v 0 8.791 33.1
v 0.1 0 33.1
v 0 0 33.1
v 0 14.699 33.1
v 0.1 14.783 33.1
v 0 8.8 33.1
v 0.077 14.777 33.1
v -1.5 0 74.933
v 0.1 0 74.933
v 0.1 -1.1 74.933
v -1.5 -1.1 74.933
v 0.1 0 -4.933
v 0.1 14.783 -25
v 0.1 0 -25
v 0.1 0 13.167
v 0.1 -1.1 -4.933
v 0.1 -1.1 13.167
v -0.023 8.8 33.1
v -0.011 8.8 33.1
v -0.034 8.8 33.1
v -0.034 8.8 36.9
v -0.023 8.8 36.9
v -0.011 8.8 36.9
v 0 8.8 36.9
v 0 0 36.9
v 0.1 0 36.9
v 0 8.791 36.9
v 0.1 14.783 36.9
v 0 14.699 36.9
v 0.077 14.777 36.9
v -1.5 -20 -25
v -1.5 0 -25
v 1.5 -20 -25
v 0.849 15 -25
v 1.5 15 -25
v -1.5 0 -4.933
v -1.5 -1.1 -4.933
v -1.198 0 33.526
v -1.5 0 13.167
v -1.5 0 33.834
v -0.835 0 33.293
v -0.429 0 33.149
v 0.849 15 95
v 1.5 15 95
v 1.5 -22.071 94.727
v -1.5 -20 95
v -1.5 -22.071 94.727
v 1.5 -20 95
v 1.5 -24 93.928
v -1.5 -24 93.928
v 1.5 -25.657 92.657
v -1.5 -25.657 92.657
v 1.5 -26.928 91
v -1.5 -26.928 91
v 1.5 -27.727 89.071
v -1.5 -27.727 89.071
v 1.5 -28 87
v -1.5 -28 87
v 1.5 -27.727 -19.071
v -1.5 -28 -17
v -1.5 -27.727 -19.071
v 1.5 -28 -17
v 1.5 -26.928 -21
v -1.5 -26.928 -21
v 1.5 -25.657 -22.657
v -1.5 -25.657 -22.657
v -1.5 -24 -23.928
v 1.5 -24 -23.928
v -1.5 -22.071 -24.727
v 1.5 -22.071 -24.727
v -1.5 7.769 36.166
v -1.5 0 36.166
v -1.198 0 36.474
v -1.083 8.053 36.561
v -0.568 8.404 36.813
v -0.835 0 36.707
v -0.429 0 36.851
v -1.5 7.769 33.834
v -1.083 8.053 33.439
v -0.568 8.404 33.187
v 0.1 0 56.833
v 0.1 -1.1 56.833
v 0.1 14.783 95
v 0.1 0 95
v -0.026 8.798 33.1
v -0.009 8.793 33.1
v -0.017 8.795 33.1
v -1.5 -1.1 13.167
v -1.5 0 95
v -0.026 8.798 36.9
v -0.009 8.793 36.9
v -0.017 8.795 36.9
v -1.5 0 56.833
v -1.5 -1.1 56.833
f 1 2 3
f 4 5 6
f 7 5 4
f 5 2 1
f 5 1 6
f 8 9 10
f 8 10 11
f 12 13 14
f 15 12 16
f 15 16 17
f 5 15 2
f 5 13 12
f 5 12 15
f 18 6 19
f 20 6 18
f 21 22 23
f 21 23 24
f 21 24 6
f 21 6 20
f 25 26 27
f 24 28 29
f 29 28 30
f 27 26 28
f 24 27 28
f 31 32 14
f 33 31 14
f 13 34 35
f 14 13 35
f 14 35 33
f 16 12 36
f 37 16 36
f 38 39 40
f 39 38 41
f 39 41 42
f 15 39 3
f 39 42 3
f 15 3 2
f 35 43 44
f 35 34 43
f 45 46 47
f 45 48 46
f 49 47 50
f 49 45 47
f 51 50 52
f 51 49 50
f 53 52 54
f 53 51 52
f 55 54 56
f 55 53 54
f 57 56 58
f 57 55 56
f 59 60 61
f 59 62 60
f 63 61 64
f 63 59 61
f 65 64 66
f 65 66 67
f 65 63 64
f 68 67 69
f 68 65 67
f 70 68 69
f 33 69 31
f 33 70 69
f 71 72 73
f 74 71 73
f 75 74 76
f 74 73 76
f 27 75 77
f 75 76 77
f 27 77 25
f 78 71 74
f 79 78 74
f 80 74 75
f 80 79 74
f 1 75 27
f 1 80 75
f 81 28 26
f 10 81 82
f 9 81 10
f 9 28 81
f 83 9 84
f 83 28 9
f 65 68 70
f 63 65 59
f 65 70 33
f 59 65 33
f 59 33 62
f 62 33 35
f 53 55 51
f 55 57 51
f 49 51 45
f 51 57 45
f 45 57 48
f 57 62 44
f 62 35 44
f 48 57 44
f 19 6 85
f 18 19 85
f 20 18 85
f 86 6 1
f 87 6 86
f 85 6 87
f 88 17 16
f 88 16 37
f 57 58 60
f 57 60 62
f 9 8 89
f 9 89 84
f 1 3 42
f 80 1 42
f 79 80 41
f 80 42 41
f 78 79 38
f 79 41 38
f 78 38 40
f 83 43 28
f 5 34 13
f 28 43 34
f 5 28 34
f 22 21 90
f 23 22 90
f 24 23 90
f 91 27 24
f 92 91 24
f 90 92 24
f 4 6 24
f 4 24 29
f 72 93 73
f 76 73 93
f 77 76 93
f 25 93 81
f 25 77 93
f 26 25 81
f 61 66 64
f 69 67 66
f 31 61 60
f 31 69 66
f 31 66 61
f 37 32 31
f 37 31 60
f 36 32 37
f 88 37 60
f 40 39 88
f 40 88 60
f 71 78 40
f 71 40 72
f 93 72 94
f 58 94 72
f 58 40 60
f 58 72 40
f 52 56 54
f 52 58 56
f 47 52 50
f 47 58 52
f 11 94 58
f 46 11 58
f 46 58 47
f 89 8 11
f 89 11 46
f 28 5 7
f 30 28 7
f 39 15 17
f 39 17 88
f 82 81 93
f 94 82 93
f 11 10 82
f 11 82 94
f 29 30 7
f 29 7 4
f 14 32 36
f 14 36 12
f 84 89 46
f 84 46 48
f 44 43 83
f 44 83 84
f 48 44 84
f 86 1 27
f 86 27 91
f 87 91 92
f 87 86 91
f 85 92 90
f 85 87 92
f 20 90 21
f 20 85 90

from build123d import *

# Parameters (mm, degrees)
F0_W      = 3
F0_H      = 30
F1_DEPTH  = 70
F2_W      = 1.5
F2_H      = 15
F3_DEPTH  = 70
F5_DEPTH  = 8.8
F6_DEPTH  = 25
F7_DEPTH  = 25
F8_DEPTH  = 13
F9_W      = 0.1
F9_H      = 58.1
F10_DEPTH = 15
F12_DEPTH = 130
F14_DEPTH = 130
F15_R     = 8
F17_W     = 1.6
F17_H     = 18.1
F16_W     = 1.6
F16_H     = 18.1
F18_DEPTH = 1.1
F20_DEPTH = 44.7


with BuildPart() as f1:
    # F0 (on Top) → F1 (new body)
    with BuildSketch(Plane.XY):
        Rectangle(F0_W, F0_H)
    extrude(amount=F1_DEPTH)

    # F2 (on face) → F3 (cut)
    with BuildSketch(Plane.XY.offset(70)):
        with Locations((-0.75, 7.5)):
            Rectangle(F2_W, F2_H)
    extrude(amount=-F3_DEPTH, mode=Mode.SUBTRACT)

    # F4 (on face) → F5 (join)
    with BuildSketch(Plane(origin=(0, 0, 0), x_dir=(-1, 0, 0), z_dir=(0, 1, 0))):
        with BuildLine():
            Line((1.5, 33.833809621), (1.5, 36.166190379))
            ThreePointArc((1.5, 36.166190379), (0.8349366084, 36.7067163971), (0, 36.9))
            Line((0, 36.9), (0, 33.1))
            ThreePointArc((0, 33.1), (0.8349366084, 33.2932836029), (1.5, 33.833809621))
        make_face()
    extrude(amount=F5_DEPTH)

    # F6 (add): a face of the model
    f6_faces = [f1.faces().sort_by_distance(p)[0] for p in [
        (0.25, -2.5, 0),
    ]]
    extrude(f6_faces, amount=F6_DEPTH)

    # F7 (add): a face of the model
    f7_faces = [f1.faces().sort_by_distance(p)[0] for p in [
        (0.25, -2.5, 70),
    ]]
    extrude(f7_faces, amount=F7_DEPTH)

    # F8 (add): a face of the model
    f8_faces = [f1.faces().sort_by_distance(p)[0] for p in [
        (0, -15, 35),
    ]]
    extrude(f8_faces, amount=F8_DEPTH)

    # F9 (on face) → F10 (cut)
    with BuildSketch(Plane(origin=(0, 15, 0), x_dir=(-1, 0, 0), z_dir=(0, 1, 0))):
        with Locations((-0.05, 65.95)):
            Rectangle(F9_W, F9_H)
        with Locations((-0.05, 4.05)):
            Rectangle(F9_W, F9_H)
    extrude(amount=-F10_DEPTH, mode=Mode.SUBTRACT)

    # F11 (on face) → F12 (cut)
    with BuildSketch(Plane(origin=(0, 0, -25), x_dir=(1, 0, 0), z_dir=(0, 0, -1))):
        Polygon((-1.7338935286, -15.3450844809), (0.3, -15), (0.1, -15), (0.1, -14.7996032594), (-1.6308530467, -13.0653167143), align=None)
    extrude(amount=-F12_DEPTH, mode=Mode.SUBTRACT)

    # F13 (on face) → F14 (cut)
    with BuildSketch(Plane(origin=(0, 0, -25), x_dir=(1, 0, 0), z_dir=(0, 0, -1))):
        Polygon((0.1, -14.7832093728), (0.0735654176, -14.7755583748), (-0.2710041881, -15.1656661183), (0.654931704, -15.2749568224), (1.0070909047, -15.0457499549), (0.8490225115, -15), (0.1, -15), align=None)
        Polygon((0.8490225115, -15), (0.1, -14.7832093728), (0.1, -15), align=None)
    extrude(amount=-F14_DEPTH, mode=Mode.SUBTRACT)

    # F15
    f15_edges = [f1.edges().sort_by_distance(p)[0] for p in [
        (0, -28, 95),
        (0, -28, -25),
    ]]
    fillet(f15_edges, radius=F15_R)

    # F17 (on face) + F16 (on face) → F18 (cut)
    with BuildSketch(Plane(origin=(0, 0, 0), x_dir=(-1, 0, 0), z_dir=(0, 1, 0))):
        with Locations((0.7, 4.1168239134)):
            Rectangle(F17_W, F17_H)
    with BuildSketch(Plane(origin=(0, 0, 0), x_dir=(-1, 0, 0), z_dir=(0, 1, 0))):
        with Locations((0.7, 65.8831760866)):
            Rectangle(F16_W, F16_H)
    extrude(amount=-F18_DEPTH, mode=Mode.SUBTRACT)

    # F19 (on Top) → F20 (cut)
    with BuildSketch(Plane.XY):
        Polygon((-4.6543548815, 8.3620538935), (-2.3670103401, 7.1775359102), (0, 8.7909307331), (-4.6543548815, 10.0162932649), align=None)
    extrude(amount=F20_DEPTH, mode=Mode.SUBTRACT)


solid = f1.part
